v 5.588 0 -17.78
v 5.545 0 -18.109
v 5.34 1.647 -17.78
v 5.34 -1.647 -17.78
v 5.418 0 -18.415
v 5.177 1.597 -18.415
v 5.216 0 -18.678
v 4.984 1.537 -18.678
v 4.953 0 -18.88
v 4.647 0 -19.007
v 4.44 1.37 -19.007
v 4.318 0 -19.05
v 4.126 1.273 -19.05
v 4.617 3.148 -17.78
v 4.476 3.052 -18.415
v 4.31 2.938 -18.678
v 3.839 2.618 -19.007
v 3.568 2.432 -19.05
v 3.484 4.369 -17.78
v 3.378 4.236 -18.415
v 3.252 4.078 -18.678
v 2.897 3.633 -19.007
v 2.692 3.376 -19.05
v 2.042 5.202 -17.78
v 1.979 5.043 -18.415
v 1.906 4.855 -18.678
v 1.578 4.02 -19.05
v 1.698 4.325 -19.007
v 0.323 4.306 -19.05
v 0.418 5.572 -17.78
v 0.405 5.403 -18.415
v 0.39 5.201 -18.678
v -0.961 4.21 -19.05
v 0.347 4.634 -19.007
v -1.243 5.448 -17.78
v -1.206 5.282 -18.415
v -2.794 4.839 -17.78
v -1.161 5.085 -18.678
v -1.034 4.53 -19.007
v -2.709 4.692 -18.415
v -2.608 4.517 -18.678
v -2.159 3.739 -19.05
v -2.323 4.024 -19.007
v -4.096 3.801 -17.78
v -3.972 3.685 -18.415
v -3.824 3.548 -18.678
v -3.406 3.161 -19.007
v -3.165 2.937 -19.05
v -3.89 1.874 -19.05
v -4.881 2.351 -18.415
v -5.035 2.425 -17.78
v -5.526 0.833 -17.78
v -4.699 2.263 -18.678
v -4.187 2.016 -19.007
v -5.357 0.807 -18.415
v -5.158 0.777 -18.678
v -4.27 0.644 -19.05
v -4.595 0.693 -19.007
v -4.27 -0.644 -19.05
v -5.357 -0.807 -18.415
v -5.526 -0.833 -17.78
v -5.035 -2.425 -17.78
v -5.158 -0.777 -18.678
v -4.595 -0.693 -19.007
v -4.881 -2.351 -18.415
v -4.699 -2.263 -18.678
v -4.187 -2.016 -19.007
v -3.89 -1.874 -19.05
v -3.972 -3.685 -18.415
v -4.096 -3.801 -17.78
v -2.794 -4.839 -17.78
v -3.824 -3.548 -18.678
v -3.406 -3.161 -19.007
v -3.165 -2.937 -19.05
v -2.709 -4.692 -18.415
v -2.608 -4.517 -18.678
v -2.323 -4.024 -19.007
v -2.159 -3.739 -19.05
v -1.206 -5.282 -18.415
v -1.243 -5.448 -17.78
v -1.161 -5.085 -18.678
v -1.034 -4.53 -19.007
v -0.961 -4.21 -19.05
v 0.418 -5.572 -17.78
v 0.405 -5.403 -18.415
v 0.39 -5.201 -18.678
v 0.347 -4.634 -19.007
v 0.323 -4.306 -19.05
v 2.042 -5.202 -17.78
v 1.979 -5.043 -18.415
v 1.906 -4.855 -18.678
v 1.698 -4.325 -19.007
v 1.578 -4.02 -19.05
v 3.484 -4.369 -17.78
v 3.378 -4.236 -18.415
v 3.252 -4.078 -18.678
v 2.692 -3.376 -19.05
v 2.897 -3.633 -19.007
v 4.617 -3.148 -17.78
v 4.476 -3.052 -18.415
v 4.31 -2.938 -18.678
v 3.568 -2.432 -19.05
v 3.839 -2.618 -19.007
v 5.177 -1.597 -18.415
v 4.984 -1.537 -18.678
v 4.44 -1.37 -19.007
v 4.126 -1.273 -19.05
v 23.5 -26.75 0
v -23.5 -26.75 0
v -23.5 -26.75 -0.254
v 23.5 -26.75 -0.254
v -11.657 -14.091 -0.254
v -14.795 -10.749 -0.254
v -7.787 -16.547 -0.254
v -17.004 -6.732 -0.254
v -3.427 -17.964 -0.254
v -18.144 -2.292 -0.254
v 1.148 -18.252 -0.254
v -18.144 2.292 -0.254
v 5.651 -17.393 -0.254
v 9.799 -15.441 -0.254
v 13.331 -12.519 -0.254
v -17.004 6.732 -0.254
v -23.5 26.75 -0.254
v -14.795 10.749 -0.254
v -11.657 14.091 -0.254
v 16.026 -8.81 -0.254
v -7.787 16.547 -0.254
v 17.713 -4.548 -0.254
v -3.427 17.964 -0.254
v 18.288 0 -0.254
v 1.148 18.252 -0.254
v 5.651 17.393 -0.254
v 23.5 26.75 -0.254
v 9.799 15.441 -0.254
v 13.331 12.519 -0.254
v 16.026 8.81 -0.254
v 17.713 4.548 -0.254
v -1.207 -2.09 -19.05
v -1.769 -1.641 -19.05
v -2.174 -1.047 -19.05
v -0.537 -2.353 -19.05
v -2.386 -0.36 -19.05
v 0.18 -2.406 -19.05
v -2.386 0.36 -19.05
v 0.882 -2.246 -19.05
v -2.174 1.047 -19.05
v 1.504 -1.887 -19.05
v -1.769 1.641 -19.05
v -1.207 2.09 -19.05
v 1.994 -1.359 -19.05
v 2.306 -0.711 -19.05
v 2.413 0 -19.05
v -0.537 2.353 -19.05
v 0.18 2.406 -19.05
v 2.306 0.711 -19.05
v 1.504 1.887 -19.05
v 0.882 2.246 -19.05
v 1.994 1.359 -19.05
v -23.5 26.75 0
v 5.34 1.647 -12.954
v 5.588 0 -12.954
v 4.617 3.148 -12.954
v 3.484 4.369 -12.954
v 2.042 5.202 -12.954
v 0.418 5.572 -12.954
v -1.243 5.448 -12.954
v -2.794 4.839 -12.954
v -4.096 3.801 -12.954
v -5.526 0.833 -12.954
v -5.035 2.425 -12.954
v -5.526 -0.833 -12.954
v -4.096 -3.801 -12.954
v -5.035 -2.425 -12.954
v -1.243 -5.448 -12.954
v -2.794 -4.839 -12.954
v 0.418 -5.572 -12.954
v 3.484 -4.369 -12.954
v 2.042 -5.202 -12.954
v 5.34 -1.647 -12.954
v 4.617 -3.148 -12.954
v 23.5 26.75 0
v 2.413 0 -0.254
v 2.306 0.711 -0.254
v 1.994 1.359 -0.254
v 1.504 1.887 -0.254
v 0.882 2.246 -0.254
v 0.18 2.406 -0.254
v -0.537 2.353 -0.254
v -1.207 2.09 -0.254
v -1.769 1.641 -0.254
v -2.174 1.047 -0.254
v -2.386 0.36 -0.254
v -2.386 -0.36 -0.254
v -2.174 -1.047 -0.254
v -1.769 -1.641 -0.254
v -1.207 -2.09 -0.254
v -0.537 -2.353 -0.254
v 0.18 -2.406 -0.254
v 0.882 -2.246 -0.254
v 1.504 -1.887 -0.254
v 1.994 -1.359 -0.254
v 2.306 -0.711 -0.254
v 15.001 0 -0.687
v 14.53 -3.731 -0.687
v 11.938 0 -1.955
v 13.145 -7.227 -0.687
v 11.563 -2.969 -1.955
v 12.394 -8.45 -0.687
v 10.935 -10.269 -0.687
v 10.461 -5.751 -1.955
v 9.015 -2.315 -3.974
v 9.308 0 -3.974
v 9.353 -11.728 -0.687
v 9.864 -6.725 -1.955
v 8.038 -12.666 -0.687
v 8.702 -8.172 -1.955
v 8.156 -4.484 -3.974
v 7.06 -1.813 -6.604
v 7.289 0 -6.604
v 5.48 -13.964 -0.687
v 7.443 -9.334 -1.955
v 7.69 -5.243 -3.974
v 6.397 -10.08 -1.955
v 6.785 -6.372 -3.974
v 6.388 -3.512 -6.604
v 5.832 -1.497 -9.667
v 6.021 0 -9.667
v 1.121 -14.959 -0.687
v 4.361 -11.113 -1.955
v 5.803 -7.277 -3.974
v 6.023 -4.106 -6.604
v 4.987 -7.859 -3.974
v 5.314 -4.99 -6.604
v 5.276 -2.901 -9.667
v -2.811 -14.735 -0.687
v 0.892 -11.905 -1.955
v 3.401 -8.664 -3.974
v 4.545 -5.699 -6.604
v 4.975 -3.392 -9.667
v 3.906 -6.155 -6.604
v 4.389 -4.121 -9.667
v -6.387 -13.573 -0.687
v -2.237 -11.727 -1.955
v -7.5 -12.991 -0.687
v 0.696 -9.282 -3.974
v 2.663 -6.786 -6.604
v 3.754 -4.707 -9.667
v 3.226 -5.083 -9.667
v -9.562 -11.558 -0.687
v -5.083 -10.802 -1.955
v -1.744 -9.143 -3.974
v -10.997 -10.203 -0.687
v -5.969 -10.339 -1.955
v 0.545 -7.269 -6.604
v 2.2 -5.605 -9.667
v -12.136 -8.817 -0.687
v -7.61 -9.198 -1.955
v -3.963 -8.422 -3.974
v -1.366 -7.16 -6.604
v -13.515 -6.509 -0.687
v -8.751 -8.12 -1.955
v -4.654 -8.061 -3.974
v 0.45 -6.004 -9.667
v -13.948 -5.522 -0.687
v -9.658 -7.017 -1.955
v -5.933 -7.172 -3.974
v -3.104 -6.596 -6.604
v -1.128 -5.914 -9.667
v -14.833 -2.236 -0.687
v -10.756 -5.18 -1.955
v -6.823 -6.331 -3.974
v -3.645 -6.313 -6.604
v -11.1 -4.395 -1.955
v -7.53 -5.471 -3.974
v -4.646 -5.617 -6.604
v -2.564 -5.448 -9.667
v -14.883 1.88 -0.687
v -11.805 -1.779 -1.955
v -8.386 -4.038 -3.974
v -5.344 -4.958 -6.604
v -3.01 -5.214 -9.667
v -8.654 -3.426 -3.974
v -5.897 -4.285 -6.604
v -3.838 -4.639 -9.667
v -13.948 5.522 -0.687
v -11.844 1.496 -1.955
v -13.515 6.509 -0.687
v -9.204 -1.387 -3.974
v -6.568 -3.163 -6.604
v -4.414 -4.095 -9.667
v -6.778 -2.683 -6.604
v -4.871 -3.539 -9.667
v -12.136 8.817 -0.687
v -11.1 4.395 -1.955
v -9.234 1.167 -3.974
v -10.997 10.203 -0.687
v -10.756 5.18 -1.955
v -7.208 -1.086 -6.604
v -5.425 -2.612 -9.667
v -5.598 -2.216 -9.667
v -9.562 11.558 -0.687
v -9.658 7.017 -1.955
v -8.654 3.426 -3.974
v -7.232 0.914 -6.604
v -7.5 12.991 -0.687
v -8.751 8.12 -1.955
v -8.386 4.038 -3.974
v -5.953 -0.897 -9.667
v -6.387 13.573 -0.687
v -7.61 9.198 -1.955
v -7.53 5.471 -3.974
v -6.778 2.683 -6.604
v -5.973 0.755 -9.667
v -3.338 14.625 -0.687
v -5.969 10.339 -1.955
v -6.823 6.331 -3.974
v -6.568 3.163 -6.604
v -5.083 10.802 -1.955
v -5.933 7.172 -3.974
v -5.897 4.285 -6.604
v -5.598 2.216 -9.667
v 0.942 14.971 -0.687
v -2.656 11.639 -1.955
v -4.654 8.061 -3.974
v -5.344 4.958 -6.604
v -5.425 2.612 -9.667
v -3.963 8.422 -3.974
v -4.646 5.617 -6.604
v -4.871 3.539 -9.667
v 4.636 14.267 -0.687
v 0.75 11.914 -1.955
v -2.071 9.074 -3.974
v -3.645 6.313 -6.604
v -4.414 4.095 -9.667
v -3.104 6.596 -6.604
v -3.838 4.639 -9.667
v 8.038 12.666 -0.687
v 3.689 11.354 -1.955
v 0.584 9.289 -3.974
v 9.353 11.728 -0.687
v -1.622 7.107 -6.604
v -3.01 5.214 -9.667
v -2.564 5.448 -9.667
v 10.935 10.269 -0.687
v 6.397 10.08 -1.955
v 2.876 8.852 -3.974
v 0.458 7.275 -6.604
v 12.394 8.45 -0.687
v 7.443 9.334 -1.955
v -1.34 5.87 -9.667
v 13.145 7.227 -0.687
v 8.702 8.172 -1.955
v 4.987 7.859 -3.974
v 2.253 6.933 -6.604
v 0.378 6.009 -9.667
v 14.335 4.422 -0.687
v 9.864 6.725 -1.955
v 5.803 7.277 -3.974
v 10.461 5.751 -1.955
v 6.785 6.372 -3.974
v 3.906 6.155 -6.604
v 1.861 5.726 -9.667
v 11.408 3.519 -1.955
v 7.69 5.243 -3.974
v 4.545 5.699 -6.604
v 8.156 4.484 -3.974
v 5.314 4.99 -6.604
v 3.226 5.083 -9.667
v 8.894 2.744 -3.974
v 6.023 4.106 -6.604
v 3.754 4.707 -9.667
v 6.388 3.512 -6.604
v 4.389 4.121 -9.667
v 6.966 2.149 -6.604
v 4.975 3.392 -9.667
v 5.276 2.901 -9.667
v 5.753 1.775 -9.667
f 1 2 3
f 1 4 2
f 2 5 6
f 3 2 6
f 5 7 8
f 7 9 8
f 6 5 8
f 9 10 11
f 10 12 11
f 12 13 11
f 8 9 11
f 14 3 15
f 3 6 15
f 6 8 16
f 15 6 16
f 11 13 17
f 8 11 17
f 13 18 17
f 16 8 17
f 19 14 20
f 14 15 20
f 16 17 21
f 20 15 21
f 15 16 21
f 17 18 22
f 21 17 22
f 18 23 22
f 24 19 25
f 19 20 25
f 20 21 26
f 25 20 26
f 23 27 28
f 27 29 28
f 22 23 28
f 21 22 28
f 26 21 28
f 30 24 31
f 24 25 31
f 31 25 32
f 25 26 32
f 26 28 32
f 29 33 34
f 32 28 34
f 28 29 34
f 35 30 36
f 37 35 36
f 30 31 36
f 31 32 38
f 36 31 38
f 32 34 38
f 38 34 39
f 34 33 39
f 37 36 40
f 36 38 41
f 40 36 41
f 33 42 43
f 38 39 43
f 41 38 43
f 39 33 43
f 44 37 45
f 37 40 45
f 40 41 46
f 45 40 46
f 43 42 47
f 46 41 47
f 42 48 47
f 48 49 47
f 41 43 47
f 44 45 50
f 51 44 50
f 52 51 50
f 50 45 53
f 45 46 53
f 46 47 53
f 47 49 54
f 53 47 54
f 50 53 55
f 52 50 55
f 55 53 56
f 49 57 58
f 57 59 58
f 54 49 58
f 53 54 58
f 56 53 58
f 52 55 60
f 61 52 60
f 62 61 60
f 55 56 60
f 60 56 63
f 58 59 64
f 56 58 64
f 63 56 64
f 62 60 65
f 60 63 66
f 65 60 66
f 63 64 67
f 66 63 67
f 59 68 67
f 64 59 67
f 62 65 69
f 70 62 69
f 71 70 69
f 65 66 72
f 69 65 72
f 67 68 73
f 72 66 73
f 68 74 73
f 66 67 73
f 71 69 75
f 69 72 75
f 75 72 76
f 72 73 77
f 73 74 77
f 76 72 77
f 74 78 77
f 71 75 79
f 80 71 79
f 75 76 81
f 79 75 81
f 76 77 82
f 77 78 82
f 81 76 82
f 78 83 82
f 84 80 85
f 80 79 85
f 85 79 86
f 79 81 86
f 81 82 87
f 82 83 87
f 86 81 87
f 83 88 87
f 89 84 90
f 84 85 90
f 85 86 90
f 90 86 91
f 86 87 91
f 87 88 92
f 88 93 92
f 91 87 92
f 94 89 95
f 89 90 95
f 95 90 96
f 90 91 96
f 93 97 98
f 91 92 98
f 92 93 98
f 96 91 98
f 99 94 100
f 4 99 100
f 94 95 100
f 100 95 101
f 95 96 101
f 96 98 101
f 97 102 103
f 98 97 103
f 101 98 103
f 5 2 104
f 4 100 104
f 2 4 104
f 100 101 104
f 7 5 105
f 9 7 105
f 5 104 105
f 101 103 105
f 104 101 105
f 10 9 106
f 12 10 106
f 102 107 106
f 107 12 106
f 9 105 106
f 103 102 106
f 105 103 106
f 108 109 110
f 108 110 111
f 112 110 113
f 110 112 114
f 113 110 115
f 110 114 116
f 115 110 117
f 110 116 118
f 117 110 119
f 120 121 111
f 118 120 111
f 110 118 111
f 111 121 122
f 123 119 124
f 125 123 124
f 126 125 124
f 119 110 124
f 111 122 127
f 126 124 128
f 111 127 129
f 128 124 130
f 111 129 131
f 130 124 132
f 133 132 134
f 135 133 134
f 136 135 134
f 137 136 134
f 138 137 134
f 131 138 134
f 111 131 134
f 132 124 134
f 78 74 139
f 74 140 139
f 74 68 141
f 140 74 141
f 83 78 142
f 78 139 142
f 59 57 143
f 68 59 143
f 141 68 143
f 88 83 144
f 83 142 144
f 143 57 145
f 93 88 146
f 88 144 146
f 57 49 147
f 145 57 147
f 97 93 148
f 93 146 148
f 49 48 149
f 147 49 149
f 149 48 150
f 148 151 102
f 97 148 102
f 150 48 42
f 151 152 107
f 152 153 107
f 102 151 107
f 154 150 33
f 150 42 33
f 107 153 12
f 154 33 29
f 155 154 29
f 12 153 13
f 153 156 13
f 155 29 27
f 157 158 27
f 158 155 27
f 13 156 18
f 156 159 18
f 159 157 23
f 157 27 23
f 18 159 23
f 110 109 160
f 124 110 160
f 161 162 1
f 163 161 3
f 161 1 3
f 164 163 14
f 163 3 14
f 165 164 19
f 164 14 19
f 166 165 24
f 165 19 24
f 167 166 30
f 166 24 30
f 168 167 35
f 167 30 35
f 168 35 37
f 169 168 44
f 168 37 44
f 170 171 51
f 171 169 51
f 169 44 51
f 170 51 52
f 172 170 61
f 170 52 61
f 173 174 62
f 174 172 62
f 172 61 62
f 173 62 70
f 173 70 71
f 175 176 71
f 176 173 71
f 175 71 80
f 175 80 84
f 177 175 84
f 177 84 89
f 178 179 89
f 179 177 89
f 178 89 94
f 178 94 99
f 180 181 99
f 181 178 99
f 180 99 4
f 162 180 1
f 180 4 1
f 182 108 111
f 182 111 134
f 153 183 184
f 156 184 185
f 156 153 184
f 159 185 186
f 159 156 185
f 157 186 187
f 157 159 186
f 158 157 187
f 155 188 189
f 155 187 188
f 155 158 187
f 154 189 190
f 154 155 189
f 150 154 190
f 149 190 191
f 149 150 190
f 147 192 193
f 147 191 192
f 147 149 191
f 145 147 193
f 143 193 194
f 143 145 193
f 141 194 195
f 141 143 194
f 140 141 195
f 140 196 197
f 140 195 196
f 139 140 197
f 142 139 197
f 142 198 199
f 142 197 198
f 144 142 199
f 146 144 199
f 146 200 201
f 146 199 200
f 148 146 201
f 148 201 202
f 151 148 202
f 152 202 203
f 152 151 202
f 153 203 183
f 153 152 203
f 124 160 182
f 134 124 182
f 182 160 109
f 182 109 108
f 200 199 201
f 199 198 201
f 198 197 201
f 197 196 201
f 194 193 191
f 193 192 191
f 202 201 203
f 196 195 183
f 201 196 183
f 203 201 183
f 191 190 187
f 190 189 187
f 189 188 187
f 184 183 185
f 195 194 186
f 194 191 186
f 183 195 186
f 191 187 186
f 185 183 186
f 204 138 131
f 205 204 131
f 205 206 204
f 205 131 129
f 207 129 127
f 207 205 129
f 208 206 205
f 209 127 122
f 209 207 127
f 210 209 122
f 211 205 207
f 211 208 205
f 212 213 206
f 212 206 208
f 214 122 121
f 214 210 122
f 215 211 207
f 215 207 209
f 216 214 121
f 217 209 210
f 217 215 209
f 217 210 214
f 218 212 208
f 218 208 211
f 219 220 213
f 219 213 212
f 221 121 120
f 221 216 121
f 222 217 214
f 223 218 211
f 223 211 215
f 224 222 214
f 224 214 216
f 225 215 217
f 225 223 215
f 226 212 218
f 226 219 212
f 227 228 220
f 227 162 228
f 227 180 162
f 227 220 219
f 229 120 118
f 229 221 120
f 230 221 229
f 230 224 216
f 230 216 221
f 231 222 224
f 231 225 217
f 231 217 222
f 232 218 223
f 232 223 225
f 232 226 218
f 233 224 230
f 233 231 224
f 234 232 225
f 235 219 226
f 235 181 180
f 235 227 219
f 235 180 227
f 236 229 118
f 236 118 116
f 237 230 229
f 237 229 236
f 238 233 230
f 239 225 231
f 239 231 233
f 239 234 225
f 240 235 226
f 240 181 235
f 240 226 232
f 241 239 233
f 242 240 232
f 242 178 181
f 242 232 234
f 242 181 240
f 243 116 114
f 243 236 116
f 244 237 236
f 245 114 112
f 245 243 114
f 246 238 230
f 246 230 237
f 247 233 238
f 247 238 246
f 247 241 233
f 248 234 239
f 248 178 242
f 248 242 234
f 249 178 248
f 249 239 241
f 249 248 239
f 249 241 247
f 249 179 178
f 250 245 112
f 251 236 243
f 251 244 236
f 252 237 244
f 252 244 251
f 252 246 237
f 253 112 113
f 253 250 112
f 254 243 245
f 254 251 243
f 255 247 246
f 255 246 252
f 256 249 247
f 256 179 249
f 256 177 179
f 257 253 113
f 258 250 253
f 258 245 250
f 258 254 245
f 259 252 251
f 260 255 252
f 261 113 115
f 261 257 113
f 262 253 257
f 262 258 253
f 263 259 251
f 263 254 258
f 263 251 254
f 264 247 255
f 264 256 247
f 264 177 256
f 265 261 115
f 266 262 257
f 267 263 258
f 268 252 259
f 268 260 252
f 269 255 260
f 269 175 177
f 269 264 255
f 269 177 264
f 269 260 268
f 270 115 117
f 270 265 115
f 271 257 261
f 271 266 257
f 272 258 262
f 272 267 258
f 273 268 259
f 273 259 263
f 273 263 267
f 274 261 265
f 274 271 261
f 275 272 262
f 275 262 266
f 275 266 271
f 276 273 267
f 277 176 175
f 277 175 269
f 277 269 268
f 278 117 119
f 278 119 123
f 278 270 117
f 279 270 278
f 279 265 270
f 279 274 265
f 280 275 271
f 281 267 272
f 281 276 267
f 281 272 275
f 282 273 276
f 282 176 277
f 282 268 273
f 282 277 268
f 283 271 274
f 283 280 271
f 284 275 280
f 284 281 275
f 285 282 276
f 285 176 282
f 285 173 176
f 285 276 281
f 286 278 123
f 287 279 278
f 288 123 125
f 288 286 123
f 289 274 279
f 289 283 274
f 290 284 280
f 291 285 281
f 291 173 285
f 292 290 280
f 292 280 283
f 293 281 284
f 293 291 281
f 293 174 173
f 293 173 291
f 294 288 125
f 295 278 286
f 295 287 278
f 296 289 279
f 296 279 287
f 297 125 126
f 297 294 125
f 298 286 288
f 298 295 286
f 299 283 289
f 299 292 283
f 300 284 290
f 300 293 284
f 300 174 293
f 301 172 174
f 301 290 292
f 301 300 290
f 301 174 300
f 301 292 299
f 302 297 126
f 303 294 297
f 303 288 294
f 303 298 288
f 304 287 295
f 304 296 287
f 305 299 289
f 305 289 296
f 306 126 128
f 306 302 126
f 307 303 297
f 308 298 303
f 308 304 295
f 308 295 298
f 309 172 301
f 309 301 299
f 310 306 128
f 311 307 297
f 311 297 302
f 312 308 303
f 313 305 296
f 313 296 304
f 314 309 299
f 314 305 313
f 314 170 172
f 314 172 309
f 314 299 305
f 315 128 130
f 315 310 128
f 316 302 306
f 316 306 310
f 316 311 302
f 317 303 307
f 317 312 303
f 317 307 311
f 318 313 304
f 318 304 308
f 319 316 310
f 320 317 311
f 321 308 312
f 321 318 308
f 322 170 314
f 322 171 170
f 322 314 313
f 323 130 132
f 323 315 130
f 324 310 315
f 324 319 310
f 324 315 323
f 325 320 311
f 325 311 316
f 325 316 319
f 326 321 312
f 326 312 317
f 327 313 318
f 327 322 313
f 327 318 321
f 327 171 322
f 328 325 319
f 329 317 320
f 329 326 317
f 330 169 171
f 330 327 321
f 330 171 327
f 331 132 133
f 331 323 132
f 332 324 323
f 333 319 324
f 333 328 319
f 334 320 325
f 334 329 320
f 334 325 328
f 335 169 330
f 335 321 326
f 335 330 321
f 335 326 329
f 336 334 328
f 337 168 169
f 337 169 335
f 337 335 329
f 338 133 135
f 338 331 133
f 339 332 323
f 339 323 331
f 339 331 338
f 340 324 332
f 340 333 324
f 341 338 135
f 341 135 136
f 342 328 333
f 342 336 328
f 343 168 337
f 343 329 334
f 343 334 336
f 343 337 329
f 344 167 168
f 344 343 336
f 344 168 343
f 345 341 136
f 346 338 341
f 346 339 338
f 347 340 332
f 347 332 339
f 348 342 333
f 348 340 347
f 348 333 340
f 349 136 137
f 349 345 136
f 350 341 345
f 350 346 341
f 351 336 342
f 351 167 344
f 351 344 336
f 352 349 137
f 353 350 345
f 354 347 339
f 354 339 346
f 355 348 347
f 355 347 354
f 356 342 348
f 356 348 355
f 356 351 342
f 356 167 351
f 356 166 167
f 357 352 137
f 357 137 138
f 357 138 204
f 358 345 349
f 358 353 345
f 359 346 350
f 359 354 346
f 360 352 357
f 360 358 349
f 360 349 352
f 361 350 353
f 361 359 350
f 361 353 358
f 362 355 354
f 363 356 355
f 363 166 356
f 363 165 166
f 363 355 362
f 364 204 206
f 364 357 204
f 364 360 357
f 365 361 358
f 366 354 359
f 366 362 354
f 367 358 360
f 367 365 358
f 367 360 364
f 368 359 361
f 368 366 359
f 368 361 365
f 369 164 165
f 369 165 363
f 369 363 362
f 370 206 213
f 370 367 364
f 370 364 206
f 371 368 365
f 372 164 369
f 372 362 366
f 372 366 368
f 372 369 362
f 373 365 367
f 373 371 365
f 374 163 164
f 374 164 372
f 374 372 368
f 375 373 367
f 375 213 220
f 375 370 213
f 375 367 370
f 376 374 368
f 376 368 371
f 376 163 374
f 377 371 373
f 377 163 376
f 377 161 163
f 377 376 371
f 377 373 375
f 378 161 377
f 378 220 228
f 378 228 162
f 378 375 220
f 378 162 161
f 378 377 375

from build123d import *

# Parameters (mm, degrees)
BOSS_EXTRUDE1_START       = -19.05
BOSS_EXTRUDE1_OUTLINE_R   = 5.588
BOSS_EXTRUDE1_OUTLINE_R_2 = 2.413
BOSS_EXTRUDE1_DEPTH       = 19.05
SKETCH16_W                = 47
SKETCH16_H                = 53.5
BOSS_EXTRUDE2_DEPTH       = 0.254
FILLET1_R                 = 12.7
FILLET3_R                 = 1.27


# Read off the part's stored shape, not the designer's step: Boss-Extrude1
with BuildPart() as part:
    # Boss-Extrude1 outline → Boss-Extrude1 (new body)
    with BuildSketch(Plane.XY.offset(BOSS_EXTRUDE1_START)):
        Circle(BOSS_EXTRUDE1_OUTLINE_R)
        Circle(BOSS_EXTRUDE1_OUTLINE_R_2, mode=Mode.SUBTRACT)
    extrude(amount=BOSS_EXTRUDE1_DEPTH)

    # Sketch16 → Boss-Extrude2 (add)
    with BuildSketch(Plane.XY):
        Rectangle(SKETCH16_W, SKETCH16_H)
    extrude(amount=-BOSS_EXTRUDE2_DEPTH)

    # Fillet1
    fillet1_edges = [part.edges().sort_by_distance(p)[0] for p in [
        (-5.588, 0, -0.254),
    ]]
    fillet(fillet1_edges, radius=FILLET1_R)

    # Fillet3
    fillet3_edges = [part.edges().sort_by_distance(p)[0] for p in [
        (-5.588, 0, -19.05),
    ]]
    fillet(fillet3_edges, radius=FILLET3_R)


solid = part.part
